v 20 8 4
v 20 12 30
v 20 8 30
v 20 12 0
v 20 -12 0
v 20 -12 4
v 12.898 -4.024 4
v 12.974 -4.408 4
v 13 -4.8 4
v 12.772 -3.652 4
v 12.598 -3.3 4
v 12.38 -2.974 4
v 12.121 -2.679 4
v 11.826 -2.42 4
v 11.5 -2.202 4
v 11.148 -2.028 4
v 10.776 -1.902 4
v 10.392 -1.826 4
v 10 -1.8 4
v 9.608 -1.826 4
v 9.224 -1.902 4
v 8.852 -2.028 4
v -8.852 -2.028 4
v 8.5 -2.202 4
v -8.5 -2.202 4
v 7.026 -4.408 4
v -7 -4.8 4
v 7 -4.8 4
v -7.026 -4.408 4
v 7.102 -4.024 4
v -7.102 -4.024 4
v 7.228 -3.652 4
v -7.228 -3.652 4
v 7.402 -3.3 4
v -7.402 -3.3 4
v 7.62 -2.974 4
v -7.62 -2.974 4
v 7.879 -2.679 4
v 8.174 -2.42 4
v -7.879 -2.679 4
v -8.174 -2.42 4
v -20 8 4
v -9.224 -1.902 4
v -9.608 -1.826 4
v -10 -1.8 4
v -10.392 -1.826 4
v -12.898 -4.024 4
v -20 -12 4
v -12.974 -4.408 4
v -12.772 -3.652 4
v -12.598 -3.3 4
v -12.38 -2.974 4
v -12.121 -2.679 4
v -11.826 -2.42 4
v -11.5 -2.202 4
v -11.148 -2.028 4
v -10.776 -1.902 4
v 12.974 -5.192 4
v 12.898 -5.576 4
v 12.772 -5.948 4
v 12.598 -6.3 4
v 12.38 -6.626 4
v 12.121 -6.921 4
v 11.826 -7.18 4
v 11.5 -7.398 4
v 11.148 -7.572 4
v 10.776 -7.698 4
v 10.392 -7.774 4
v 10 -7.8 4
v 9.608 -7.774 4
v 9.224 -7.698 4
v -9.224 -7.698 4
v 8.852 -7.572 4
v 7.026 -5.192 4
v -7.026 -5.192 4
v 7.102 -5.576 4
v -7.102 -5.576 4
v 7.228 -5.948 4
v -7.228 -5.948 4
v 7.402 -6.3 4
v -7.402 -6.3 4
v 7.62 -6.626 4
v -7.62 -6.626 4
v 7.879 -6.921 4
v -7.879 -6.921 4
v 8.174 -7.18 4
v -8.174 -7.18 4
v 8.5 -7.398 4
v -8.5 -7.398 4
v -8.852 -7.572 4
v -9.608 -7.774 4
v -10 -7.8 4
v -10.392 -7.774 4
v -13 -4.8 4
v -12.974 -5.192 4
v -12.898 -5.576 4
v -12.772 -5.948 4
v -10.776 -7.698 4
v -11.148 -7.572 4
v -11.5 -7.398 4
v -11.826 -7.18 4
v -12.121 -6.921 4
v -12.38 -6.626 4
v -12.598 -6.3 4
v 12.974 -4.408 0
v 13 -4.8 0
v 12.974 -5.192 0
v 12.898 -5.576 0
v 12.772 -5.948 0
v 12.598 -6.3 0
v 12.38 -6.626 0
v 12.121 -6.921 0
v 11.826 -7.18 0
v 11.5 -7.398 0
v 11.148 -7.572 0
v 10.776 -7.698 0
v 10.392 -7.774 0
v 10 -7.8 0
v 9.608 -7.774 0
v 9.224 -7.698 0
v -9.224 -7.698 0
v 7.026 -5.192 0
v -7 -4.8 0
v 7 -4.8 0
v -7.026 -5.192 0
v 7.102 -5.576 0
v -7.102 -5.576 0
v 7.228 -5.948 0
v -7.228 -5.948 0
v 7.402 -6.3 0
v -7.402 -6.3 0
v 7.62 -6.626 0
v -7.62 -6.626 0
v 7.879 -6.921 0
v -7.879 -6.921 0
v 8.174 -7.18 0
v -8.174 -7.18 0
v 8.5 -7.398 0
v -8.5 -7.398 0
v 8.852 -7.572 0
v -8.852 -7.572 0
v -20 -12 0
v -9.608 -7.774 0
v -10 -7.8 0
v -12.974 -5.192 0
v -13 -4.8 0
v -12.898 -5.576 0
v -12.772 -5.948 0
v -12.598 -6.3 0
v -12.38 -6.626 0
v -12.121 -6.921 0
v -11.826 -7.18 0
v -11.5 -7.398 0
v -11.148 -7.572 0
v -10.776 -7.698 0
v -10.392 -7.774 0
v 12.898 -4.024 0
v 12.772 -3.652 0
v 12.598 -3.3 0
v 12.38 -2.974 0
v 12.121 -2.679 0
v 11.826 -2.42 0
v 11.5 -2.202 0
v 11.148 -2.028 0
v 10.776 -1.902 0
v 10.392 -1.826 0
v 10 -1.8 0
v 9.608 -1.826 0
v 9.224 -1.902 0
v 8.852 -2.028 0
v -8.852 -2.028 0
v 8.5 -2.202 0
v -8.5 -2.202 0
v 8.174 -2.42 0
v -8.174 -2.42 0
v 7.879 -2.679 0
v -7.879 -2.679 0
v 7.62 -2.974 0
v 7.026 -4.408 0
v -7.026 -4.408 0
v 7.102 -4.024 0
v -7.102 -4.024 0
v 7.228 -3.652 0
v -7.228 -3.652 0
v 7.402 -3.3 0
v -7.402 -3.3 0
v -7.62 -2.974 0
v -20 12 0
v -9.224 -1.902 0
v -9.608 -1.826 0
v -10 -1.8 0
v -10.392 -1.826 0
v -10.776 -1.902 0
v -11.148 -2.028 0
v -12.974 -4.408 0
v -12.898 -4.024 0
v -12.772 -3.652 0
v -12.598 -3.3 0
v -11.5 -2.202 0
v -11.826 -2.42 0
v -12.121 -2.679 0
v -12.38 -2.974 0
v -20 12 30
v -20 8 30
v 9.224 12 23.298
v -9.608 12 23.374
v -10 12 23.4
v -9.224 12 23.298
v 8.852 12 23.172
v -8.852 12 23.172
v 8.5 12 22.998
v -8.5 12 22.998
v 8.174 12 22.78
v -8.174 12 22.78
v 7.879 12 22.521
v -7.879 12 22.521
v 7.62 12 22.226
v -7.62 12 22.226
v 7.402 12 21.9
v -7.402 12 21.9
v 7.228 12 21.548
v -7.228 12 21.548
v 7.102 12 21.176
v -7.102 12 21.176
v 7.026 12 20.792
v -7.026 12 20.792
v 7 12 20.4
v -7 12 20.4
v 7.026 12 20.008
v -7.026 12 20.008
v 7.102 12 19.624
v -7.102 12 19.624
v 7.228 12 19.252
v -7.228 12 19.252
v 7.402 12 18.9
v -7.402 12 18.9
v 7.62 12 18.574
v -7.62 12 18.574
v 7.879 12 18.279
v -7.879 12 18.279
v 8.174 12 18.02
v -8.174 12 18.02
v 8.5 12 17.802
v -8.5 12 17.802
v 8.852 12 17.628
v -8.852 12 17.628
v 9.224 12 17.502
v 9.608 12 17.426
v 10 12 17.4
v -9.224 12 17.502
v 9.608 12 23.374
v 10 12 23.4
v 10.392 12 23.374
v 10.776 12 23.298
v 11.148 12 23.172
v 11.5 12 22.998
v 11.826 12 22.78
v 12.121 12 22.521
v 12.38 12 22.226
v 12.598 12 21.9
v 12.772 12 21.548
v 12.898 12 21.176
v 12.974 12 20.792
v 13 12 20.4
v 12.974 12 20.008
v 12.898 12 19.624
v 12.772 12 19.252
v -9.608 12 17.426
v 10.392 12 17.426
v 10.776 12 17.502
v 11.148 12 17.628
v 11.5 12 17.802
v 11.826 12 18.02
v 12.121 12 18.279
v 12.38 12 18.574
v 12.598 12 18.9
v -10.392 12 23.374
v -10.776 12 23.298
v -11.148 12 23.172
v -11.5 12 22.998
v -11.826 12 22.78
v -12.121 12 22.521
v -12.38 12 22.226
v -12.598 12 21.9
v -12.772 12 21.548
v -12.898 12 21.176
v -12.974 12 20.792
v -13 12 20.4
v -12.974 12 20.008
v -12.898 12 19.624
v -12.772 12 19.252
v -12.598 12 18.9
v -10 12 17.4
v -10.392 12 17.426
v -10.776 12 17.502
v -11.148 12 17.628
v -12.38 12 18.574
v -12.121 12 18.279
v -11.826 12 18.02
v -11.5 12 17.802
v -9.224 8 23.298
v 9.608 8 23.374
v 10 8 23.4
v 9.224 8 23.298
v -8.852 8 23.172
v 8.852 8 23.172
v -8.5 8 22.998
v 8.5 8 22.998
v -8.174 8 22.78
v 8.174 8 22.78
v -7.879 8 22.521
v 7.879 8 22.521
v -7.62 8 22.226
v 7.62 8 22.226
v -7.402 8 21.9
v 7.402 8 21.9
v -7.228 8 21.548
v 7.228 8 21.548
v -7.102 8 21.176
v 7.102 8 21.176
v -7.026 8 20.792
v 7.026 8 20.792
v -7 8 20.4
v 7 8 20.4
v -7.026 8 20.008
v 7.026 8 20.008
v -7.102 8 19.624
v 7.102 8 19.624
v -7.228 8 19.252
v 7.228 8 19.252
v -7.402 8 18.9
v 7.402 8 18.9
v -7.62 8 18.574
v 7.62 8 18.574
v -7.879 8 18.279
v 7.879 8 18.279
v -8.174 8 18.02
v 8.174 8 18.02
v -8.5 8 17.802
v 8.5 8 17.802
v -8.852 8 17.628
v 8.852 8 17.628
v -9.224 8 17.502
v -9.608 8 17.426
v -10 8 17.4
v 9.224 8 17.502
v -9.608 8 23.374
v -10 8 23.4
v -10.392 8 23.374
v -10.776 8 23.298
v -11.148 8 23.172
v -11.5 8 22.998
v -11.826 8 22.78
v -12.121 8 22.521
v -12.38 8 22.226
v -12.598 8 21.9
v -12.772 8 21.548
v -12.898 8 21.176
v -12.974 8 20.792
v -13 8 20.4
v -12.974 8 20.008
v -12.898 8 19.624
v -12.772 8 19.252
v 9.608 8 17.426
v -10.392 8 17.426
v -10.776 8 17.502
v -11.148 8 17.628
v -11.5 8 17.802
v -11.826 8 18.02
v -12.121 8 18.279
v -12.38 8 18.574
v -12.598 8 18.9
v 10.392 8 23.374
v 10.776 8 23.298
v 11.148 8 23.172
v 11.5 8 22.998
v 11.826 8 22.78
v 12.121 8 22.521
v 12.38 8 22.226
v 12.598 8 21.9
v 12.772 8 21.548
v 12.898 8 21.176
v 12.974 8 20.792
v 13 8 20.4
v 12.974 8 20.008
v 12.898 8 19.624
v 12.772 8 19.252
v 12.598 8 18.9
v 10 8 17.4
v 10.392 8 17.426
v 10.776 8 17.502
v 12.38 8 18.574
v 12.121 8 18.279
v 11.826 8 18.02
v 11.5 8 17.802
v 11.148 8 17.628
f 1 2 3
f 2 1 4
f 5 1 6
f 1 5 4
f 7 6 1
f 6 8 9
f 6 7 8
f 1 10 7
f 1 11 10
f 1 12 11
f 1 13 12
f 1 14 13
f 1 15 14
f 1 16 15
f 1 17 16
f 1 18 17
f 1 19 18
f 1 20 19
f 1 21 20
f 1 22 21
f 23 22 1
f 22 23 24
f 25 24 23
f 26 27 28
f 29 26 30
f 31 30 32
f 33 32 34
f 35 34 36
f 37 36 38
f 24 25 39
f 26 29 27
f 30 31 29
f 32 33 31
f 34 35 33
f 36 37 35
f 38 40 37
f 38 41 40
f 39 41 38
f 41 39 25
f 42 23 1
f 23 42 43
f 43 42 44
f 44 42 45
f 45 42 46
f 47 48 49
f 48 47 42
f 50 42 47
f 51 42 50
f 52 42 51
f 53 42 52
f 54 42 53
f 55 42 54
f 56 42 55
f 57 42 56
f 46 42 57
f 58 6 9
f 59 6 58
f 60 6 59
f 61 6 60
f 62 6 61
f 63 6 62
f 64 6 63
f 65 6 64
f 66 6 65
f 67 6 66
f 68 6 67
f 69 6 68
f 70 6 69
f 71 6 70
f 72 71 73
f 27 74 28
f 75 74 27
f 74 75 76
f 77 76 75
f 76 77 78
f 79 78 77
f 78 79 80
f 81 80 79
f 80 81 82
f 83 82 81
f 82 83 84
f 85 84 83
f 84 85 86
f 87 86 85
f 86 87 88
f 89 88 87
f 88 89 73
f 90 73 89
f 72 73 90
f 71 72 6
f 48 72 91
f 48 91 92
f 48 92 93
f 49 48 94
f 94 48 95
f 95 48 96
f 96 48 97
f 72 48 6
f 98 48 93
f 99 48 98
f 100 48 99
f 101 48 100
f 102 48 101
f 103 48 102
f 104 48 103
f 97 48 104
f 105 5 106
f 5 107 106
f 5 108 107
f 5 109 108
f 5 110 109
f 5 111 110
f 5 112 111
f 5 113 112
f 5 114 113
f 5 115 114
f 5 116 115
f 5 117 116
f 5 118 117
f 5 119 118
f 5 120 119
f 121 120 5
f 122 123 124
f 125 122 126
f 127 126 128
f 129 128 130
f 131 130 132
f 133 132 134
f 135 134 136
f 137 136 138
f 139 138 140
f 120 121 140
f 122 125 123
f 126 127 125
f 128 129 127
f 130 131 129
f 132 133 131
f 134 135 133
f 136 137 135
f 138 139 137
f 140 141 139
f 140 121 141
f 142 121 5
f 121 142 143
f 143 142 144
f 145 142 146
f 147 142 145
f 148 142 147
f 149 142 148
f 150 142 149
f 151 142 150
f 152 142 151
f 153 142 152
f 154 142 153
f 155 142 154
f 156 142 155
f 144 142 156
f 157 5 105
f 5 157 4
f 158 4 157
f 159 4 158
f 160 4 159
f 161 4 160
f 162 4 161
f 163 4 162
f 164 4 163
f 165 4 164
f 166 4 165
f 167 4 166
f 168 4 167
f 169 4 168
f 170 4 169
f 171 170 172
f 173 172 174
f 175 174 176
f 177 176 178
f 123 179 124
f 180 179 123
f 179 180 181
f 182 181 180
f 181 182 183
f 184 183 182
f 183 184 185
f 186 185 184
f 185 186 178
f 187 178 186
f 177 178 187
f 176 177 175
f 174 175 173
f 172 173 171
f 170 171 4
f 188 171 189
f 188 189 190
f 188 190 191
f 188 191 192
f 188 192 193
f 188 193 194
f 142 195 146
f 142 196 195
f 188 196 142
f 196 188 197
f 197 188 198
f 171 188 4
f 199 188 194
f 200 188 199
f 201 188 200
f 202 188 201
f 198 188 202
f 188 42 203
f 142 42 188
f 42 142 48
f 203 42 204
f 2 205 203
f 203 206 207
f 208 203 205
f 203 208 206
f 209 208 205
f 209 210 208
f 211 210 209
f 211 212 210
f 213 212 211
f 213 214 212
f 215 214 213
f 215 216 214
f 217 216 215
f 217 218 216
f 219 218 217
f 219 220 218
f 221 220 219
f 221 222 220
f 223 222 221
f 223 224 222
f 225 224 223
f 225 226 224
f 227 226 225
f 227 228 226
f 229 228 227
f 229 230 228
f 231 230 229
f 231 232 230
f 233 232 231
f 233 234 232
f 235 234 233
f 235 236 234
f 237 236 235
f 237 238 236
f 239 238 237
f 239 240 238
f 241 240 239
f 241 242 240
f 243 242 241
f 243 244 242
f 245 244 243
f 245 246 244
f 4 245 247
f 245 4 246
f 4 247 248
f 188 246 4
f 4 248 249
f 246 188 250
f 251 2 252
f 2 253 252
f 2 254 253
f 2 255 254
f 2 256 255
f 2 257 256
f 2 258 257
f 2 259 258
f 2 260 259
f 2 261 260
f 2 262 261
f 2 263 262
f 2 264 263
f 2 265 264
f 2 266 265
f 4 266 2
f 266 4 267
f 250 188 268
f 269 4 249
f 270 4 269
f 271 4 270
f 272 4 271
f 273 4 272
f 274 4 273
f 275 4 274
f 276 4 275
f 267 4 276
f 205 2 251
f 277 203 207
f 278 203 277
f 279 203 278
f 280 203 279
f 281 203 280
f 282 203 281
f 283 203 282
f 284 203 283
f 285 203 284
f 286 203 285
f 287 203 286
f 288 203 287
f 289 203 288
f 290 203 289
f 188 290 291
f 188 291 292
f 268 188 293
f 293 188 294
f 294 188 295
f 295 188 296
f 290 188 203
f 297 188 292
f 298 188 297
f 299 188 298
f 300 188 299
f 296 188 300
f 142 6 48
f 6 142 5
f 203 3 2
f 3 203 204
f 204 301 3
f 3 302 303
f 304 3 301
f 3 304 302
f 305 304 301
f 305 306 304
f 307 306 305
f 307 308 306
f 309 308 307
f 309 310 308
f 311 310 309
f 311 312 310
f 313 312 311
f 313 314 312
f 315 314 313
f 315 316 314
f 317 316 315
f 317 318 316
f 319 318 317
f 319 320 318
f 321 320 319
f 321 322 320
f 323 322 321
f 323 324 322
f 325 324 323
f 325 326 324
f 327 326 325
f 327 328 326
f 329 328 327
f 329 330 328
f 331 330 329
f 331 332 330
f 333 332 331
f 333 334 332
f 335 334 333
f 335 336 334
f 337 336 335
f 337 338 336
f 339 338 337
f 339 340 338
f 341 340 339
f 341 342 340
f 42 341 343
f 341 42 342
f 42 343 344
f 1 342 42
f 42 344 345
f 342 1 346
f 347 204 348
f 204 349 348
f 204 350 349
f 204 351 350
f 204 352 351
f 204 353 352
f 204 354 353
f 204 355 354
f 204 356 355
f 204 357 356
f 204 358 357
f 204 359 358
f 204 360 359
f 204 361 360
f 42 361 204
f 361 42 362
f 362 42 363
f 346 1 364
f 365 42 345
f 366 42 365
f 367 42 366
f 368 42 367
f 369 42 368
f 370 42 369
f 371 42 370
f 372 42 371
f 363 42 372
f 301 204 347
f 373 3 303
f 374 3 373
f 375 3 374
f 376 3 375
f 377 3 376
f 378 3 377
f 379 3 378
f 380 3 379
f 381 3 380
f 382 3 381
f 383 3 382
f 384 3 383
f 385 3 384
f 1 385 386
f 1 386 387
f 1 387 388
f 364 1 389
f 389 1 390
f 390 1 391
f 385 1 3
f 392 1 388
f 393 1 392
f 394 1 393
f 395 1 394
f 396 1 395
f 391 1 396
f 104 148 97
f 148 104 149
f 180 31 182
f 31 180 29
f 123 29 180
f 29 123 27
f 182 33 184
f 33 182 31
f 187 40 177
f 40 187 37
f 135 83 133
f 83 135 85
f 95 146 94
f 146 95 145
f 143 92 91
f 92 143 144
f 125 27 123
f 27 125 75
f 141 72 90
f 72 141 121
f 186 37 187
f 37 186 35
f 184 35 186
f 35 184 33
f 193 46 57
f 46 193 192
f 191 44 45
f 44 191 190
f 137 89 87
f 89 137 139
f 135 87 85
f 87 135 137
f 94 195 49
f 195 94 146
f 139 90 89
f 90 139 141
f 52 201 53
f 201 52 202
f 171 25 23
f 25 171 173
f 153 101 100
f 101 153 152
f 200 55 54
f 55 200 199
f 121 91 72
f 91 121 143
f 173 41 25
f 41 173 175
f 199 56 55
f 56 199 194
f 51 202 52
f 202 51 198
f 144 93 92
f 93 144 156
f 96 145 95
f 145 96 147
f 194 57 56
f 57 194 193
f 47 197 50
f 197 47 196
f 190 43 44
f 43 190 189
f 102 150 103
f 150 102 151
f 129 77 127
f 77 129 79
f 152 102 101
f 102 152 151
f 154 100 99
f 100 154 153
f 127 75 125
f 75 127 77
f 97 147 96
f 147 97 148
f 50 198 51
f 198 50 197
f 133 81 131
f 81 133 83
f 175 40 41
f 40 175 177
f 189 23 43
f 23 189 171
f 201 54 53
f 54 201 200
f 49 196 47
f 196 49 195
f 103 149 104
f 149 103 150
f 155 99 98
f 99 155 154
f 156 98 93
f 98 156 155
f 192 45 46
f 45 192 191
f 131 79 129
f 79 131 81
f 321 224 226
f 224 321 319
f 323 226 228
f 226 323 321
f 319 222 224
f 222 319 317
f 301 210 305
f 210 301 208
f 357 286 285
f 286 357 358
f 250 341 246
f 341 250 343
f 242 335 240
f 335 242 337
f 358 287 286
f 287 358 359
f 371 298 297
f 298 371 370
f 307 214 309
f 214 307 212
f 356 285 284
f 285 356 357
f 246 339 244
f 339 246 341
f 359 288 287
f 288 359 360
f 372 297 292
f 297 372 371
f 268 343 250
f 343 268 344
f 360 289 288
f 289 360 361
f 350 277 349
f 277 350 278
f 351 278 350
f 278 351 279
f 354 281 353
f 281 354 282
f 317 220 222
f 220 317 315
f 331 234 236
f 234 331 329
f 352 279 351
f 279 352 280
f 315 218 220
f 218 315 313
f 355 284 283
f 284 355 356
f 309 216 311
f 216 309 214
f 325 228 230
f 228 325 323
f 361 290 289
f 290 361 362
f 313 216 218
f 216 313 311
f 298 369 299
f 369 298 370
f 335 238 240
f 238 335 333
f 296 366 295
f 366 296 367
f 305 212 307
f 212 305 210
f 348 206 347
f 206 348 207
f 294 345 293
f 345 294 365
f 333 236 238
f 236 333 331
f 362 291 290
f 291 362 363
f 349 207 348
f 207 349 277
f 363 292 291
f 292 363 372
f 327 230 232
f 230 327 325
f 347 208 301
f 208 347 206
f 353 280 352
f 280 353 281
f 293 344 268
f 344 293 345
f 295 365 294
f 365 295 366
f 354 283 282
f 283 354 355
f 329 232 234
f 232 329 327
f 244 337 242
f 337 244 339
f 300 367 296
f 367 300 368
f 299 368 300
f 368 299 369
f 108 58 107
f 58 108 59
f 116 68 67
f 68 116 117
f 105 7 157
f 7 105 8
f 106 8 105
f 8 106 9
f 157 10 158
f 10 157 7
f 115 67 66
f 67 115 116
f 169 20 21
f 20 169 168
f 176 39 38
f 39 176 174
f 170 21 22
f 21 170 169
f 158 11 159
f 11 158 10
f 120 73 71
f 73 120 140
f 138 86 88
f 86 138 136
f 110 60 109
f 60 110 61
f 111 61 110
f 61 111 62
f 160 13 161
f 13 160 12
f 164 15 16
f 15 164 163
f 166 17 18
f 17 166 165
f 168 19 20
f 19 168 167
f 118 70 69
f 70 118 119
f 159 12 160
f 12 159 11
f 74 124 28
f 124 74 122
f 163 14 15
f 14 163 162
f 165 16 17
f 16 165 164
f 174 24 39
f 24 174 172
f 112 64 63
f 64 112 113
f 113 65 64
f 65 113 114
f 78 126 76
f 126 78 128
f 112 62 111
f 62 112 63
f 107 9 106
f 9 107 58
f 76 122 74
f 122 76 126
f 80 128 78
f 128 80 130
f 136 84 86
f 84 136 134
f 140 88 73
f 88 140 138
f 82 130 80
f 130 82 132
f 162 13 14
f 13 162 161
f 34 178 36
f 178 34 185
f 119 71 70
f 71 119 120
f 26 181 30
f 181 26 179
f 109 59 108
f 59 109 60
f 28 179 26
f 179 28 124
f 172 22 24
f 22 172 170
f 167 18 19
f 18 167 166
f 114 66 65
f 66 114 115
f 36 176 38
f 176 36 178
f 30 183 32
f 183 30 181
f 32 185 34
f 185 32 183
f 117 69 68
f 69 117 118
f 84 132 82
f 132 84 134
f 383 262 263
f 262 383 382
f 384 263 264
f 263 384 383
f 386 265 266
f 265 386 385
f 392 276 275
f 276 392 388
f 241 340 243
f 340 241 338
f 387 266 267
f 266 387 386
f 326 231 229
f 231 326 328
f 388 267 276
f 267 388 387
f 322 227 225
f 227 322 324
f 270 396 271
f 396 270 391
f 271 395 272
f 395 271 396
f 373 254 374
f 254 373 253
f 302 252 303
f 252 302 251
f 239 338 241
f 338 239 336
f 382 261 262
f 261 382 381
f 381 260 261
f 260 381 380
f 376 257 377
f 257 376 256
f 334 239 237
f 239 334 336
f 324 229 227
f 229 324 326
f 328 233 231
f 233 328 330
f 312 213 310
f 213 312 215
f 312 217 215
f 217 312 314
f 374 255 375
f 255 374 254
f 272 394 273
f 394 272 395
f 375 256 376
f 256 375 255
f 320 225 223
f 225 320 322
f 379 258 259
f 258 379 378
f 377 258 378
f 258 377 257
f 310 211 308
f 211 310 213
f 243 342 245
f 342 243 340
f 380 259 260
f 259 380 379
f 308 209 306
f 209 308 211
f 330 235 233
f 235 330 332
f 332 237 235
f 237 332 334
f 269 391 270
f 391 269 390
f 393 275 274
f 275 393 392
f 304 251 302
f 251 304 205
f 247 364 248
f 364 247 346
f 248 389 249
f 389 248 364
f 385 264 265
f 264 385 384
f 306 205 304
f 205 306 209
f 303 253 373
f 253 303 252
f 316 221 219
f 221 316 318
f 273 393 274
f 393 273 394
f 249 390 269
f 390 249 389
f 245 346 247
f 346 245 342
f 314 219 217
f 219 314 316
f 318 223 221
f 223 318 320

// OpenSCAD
// Synthetic mechanical fixture; authored for offline runtime validation.
// Dimensions are deliberate test geometry, not measurements of a character.
/* [Bracket] */
width = 40; // [30:2:60]
depth = 24; // [20:2:40]
height = 30; // [20:2:50]
thickness = 4; // [2:1:8]
hole_diameter = 6; // [3:1:10]
/* [Hidden] */
$fn = 48;

module bracket() {
  difference() {
    union() {
      translate([-width/2, -depth/2, 0]) cube([width, depth, thickness]);
      translate([-width/2, depth/2-thickness, 0]) cube([width, thickness, height]);
    }
    for (x = [-width/4, width/4]) {
      translate([x, -depth/5, -1]) cylinder(h=thickness+2, d=hole_diameter);
      translate([x, depth/2+1, height*0.68]) rotate([90,0,0]) cylinder(h=thickness+2, d=hole_diameter);
    }
  }
}
bracket();
